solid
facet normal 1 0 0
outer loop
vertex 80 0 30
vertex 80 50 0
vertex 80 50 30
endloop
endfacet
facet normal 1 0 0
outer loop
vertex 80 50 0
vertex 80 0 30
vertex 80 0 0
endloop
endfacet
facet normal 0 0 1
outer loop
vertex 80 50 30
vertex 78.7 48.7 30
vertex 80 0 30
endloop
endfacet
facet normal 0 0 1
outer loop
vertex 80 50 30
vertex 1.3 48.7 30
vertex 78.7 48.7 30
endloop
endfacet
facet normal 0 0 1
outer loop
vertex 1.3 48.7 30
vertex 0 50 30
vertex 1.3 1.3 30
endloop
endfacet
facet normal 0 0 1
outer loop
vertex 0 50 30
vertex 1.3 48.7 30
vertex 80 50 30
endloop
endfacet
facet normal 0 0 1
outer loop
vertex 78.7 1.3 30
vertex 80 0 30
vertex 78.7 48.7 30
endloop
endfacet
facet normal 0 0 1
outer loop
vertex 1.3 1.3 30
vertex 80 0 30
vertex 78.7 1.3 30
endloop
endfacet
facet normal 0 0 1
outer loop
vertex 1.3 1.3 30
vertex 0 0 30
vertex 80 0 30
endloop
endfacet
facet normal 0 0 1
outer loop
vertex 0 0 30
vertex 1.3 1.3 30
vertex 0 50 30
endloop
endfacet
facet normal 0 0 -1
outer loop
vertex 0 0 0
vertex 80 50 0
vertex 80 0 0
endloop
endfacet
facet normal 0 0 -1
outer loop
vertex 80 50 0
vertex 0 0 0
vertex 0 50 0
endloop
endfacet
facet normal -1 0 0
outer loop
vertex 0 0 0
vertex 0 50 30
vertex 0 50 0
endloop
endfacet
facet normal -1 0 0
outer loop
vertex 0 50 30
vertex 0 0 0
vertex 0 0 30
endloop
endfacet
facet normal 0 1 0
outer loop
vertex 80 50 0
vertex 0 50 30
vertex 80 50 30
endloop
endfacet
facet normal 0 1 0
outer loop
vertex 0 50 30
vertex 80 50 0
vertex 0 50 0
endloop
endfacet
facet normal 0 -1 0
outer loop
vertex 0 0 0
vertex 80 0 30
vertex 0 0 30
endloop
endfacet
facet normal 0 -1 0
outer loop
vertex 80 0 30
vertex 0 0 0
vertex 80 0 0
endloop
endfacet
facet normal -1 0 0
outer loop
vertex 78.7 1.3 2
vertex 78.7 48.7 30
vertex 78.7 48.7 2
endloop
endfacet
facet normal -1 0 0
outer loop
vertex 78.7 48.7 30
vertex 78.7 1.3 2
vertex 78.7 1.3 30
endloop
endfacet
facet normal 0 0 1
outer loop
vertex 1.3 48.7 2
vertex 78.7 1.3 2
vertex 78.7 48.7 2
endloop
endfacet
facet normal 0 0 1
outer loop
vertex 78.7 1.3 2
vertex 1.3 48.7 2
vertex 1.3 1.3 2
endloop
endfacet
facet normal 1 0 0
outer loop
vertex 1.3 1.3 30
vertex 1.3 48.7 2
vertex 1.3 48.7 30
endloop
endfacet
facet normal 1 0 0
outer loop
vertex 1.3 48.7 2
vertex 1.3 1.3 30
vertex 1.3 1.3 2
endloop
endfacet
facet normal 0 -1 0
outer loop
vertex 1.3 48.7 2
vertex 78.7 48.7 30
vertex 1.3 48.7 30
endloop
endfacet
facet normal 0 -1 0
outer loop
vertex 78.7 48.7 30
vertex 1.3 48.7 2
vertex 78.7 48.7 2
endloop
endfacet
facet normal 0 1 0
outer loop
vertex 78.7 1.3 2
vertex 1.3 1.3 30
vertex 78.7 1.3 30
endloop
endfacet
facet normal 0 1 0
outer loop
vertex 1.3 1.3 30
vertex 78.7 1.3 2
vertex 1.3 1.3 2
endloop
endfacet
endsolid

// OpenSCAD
$fn = 32;

// ----------------------------------------------------------------------
// Open box: 1.3 mm walls
// ----------------------------------------------------------------------

// --- parameters (mm) ---
box_l = 80;               // outer length, X
box_w = 50;               // outer width, Y
box_h = 30;               // outer height, Z
wall = 1.3;               // wall thickness
floor = 2;                // floor thickness

difference() {
  cube([box_l, box_w, box_h]);
  translate([wall, wall, floor])
    cube([box_l - 2 * wall, box_w - 2 * wall, box_h]);
}
